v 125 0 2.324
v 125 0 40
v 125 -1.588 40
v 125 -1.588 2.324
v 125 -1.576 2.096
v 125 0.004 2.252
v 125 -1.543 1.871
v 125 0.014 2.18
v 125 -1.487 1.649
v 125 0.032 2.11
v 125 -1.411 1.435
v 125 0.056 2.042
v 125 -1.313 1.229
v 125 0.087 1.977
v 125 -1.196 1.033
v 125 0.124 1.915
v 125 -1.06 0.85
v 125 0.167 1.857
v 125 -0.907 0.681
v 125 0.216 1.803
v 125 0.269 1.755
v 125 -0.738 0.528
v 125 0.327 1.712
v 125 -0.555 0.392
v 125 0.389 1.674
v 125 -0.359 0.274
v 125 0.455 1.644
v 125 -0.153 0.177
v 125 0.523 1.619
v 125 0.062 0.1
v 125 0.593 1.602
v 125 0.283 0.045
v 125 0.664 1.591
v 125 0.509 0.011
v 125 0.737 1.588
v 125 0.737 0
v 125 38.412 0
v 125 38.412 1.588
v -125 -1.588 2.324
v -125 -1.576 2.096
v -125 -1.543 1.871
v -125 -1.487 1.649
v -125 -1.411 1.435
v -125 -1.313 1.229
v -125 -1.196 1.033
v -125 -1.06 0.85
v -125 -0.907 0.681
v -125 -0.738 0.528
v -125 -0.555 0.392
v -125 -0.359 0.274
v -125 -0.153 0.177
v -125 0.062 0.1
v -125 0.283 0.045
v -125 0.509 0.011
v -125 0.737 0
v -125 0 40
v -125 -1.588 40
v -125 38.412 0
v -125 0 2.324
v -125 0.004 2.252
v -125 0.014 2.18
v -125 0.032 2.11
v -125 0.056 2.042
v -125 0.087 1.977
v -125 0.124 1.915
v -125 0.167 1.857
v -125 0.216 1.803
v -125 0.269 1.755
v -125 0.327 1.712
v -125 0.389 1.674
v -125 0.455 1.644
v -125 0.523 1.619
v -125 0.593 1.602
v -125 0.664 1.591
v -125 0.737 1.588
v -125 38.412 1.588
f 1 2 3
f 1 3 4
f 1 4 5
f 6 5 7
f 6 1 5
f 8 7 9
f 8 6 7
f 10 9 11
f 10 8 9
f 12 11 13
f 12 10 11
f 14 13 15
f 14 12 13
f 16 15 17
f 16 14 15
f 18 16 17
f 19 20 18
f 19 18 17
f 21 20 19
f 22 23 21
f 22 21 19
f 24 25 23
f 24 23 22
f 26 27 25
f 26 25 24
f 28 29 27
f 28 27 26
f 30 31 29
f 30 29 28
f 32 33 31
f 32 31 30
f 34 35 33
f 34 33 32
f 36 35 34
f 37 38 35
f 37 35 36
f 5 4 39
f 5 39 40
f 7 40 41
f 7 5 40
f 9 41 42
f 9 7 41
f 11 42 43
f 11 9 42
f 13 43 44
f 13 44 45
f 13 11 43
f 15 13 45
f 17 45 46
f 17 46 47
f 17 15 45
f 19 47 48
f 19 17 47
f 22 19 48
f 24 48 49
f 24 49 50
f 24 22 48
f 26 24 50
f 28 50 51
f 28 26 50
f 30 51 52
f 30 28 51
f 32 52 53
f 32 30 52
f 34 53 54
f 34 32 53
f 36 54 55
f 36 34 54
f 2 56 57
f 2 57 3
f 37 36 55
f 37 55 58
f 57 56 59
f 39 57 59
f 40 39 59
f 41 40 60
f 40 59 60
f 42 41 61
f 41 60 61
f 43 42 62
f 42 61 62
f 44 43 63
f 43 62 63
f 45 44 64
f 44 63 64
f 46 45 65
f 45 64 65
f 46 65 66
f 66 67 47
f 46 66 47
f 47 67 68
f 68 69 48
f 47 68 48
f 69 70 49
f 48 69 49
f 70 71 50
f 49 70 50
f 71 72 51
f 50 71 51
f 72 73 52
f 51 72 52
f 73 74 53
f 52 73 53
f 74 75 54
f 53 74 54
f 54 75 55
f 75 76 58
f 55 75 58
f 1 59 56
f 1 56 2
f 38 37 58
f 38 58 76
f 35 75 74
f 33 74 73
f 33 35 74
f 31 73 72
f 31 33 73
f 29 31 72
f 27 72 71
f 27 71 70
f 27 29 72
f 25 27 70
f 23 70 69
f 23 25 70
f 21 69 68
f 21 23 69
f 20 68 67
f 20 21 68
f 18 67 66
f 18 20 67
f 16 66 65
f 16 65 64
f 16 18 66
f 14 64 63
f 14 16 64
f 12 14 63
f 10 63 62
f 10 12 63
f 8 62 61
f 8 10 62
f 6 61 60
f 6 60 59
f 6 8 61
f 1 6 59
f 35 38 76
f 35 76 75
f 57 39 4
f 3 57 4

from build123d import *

# Parameters (mm, degrees)
SKETCH1_W                    = 250
SKETCH1_H                    = 1.5875
BASE_FLANGE1_DEPTH           = 40
EDGE_FLANGE1_STRIP_W         = 7.8232
EDGE_FLANGE1_STRIP_H         = 1.5875
EDGE_FLANGE1_STRIP_CUT_DEPTH = 250
EDGE_FLANGE1_DEPTH           = 250


# Sheet-metal steps are written as plain solids
with BuildPart() as part:
    # Sketch1 → Base-Flange1 (new body)
    with BuildSketch(Plane.XY):
        with Locations((0, -0.79375)):
            Rectangle(SKETCH1_W, SKETCH1_H)
    extrude(amount=BASE_FLANGE1_DEPTH)

    # Edge-Flange1 strip (across the edge) → Edge-Flange1 strip cut (cut)
    with BuildSketch(Plane.ZY.offset(-125)):
        with Locations((-1.5875, -0.79375)):
            Rectangle(EDGE_FLANGE1_STRIP_W, EDGE_FLANGE1_STRIP_H)
    extrude(amount=EDGE_FLANGE1_STRIP_CUT_DEPTH, mode=Mode.SUBTRACT)

    # Edge-Flange1 section (across the edge) → Edge-Flange1 (add)
    with BuildSketch(Plane.ZY.offset(-125)):
        with BuildLine():
            Line((0, 0.7366), (0, 38.4125))
            Line((0, 38.4125), (1.5875, 38.4125))
            Line((1.5875, 38.4125), (1.5875, 0.7366))
            ThreePointArc((1.5875, 0.7366), (1.803245145, 0.215745145), (2.3241, 0))
            Line((2.3241, 0), (2.3241, -1.5875))
            ThreePointArc((2.3241, -1.5875), (0.68071313, -0.90678687), (0, 0.7366))
        make_face()
    extrude(amount=EDGE_FLANGE1_DEPTH)


solid = part.part
